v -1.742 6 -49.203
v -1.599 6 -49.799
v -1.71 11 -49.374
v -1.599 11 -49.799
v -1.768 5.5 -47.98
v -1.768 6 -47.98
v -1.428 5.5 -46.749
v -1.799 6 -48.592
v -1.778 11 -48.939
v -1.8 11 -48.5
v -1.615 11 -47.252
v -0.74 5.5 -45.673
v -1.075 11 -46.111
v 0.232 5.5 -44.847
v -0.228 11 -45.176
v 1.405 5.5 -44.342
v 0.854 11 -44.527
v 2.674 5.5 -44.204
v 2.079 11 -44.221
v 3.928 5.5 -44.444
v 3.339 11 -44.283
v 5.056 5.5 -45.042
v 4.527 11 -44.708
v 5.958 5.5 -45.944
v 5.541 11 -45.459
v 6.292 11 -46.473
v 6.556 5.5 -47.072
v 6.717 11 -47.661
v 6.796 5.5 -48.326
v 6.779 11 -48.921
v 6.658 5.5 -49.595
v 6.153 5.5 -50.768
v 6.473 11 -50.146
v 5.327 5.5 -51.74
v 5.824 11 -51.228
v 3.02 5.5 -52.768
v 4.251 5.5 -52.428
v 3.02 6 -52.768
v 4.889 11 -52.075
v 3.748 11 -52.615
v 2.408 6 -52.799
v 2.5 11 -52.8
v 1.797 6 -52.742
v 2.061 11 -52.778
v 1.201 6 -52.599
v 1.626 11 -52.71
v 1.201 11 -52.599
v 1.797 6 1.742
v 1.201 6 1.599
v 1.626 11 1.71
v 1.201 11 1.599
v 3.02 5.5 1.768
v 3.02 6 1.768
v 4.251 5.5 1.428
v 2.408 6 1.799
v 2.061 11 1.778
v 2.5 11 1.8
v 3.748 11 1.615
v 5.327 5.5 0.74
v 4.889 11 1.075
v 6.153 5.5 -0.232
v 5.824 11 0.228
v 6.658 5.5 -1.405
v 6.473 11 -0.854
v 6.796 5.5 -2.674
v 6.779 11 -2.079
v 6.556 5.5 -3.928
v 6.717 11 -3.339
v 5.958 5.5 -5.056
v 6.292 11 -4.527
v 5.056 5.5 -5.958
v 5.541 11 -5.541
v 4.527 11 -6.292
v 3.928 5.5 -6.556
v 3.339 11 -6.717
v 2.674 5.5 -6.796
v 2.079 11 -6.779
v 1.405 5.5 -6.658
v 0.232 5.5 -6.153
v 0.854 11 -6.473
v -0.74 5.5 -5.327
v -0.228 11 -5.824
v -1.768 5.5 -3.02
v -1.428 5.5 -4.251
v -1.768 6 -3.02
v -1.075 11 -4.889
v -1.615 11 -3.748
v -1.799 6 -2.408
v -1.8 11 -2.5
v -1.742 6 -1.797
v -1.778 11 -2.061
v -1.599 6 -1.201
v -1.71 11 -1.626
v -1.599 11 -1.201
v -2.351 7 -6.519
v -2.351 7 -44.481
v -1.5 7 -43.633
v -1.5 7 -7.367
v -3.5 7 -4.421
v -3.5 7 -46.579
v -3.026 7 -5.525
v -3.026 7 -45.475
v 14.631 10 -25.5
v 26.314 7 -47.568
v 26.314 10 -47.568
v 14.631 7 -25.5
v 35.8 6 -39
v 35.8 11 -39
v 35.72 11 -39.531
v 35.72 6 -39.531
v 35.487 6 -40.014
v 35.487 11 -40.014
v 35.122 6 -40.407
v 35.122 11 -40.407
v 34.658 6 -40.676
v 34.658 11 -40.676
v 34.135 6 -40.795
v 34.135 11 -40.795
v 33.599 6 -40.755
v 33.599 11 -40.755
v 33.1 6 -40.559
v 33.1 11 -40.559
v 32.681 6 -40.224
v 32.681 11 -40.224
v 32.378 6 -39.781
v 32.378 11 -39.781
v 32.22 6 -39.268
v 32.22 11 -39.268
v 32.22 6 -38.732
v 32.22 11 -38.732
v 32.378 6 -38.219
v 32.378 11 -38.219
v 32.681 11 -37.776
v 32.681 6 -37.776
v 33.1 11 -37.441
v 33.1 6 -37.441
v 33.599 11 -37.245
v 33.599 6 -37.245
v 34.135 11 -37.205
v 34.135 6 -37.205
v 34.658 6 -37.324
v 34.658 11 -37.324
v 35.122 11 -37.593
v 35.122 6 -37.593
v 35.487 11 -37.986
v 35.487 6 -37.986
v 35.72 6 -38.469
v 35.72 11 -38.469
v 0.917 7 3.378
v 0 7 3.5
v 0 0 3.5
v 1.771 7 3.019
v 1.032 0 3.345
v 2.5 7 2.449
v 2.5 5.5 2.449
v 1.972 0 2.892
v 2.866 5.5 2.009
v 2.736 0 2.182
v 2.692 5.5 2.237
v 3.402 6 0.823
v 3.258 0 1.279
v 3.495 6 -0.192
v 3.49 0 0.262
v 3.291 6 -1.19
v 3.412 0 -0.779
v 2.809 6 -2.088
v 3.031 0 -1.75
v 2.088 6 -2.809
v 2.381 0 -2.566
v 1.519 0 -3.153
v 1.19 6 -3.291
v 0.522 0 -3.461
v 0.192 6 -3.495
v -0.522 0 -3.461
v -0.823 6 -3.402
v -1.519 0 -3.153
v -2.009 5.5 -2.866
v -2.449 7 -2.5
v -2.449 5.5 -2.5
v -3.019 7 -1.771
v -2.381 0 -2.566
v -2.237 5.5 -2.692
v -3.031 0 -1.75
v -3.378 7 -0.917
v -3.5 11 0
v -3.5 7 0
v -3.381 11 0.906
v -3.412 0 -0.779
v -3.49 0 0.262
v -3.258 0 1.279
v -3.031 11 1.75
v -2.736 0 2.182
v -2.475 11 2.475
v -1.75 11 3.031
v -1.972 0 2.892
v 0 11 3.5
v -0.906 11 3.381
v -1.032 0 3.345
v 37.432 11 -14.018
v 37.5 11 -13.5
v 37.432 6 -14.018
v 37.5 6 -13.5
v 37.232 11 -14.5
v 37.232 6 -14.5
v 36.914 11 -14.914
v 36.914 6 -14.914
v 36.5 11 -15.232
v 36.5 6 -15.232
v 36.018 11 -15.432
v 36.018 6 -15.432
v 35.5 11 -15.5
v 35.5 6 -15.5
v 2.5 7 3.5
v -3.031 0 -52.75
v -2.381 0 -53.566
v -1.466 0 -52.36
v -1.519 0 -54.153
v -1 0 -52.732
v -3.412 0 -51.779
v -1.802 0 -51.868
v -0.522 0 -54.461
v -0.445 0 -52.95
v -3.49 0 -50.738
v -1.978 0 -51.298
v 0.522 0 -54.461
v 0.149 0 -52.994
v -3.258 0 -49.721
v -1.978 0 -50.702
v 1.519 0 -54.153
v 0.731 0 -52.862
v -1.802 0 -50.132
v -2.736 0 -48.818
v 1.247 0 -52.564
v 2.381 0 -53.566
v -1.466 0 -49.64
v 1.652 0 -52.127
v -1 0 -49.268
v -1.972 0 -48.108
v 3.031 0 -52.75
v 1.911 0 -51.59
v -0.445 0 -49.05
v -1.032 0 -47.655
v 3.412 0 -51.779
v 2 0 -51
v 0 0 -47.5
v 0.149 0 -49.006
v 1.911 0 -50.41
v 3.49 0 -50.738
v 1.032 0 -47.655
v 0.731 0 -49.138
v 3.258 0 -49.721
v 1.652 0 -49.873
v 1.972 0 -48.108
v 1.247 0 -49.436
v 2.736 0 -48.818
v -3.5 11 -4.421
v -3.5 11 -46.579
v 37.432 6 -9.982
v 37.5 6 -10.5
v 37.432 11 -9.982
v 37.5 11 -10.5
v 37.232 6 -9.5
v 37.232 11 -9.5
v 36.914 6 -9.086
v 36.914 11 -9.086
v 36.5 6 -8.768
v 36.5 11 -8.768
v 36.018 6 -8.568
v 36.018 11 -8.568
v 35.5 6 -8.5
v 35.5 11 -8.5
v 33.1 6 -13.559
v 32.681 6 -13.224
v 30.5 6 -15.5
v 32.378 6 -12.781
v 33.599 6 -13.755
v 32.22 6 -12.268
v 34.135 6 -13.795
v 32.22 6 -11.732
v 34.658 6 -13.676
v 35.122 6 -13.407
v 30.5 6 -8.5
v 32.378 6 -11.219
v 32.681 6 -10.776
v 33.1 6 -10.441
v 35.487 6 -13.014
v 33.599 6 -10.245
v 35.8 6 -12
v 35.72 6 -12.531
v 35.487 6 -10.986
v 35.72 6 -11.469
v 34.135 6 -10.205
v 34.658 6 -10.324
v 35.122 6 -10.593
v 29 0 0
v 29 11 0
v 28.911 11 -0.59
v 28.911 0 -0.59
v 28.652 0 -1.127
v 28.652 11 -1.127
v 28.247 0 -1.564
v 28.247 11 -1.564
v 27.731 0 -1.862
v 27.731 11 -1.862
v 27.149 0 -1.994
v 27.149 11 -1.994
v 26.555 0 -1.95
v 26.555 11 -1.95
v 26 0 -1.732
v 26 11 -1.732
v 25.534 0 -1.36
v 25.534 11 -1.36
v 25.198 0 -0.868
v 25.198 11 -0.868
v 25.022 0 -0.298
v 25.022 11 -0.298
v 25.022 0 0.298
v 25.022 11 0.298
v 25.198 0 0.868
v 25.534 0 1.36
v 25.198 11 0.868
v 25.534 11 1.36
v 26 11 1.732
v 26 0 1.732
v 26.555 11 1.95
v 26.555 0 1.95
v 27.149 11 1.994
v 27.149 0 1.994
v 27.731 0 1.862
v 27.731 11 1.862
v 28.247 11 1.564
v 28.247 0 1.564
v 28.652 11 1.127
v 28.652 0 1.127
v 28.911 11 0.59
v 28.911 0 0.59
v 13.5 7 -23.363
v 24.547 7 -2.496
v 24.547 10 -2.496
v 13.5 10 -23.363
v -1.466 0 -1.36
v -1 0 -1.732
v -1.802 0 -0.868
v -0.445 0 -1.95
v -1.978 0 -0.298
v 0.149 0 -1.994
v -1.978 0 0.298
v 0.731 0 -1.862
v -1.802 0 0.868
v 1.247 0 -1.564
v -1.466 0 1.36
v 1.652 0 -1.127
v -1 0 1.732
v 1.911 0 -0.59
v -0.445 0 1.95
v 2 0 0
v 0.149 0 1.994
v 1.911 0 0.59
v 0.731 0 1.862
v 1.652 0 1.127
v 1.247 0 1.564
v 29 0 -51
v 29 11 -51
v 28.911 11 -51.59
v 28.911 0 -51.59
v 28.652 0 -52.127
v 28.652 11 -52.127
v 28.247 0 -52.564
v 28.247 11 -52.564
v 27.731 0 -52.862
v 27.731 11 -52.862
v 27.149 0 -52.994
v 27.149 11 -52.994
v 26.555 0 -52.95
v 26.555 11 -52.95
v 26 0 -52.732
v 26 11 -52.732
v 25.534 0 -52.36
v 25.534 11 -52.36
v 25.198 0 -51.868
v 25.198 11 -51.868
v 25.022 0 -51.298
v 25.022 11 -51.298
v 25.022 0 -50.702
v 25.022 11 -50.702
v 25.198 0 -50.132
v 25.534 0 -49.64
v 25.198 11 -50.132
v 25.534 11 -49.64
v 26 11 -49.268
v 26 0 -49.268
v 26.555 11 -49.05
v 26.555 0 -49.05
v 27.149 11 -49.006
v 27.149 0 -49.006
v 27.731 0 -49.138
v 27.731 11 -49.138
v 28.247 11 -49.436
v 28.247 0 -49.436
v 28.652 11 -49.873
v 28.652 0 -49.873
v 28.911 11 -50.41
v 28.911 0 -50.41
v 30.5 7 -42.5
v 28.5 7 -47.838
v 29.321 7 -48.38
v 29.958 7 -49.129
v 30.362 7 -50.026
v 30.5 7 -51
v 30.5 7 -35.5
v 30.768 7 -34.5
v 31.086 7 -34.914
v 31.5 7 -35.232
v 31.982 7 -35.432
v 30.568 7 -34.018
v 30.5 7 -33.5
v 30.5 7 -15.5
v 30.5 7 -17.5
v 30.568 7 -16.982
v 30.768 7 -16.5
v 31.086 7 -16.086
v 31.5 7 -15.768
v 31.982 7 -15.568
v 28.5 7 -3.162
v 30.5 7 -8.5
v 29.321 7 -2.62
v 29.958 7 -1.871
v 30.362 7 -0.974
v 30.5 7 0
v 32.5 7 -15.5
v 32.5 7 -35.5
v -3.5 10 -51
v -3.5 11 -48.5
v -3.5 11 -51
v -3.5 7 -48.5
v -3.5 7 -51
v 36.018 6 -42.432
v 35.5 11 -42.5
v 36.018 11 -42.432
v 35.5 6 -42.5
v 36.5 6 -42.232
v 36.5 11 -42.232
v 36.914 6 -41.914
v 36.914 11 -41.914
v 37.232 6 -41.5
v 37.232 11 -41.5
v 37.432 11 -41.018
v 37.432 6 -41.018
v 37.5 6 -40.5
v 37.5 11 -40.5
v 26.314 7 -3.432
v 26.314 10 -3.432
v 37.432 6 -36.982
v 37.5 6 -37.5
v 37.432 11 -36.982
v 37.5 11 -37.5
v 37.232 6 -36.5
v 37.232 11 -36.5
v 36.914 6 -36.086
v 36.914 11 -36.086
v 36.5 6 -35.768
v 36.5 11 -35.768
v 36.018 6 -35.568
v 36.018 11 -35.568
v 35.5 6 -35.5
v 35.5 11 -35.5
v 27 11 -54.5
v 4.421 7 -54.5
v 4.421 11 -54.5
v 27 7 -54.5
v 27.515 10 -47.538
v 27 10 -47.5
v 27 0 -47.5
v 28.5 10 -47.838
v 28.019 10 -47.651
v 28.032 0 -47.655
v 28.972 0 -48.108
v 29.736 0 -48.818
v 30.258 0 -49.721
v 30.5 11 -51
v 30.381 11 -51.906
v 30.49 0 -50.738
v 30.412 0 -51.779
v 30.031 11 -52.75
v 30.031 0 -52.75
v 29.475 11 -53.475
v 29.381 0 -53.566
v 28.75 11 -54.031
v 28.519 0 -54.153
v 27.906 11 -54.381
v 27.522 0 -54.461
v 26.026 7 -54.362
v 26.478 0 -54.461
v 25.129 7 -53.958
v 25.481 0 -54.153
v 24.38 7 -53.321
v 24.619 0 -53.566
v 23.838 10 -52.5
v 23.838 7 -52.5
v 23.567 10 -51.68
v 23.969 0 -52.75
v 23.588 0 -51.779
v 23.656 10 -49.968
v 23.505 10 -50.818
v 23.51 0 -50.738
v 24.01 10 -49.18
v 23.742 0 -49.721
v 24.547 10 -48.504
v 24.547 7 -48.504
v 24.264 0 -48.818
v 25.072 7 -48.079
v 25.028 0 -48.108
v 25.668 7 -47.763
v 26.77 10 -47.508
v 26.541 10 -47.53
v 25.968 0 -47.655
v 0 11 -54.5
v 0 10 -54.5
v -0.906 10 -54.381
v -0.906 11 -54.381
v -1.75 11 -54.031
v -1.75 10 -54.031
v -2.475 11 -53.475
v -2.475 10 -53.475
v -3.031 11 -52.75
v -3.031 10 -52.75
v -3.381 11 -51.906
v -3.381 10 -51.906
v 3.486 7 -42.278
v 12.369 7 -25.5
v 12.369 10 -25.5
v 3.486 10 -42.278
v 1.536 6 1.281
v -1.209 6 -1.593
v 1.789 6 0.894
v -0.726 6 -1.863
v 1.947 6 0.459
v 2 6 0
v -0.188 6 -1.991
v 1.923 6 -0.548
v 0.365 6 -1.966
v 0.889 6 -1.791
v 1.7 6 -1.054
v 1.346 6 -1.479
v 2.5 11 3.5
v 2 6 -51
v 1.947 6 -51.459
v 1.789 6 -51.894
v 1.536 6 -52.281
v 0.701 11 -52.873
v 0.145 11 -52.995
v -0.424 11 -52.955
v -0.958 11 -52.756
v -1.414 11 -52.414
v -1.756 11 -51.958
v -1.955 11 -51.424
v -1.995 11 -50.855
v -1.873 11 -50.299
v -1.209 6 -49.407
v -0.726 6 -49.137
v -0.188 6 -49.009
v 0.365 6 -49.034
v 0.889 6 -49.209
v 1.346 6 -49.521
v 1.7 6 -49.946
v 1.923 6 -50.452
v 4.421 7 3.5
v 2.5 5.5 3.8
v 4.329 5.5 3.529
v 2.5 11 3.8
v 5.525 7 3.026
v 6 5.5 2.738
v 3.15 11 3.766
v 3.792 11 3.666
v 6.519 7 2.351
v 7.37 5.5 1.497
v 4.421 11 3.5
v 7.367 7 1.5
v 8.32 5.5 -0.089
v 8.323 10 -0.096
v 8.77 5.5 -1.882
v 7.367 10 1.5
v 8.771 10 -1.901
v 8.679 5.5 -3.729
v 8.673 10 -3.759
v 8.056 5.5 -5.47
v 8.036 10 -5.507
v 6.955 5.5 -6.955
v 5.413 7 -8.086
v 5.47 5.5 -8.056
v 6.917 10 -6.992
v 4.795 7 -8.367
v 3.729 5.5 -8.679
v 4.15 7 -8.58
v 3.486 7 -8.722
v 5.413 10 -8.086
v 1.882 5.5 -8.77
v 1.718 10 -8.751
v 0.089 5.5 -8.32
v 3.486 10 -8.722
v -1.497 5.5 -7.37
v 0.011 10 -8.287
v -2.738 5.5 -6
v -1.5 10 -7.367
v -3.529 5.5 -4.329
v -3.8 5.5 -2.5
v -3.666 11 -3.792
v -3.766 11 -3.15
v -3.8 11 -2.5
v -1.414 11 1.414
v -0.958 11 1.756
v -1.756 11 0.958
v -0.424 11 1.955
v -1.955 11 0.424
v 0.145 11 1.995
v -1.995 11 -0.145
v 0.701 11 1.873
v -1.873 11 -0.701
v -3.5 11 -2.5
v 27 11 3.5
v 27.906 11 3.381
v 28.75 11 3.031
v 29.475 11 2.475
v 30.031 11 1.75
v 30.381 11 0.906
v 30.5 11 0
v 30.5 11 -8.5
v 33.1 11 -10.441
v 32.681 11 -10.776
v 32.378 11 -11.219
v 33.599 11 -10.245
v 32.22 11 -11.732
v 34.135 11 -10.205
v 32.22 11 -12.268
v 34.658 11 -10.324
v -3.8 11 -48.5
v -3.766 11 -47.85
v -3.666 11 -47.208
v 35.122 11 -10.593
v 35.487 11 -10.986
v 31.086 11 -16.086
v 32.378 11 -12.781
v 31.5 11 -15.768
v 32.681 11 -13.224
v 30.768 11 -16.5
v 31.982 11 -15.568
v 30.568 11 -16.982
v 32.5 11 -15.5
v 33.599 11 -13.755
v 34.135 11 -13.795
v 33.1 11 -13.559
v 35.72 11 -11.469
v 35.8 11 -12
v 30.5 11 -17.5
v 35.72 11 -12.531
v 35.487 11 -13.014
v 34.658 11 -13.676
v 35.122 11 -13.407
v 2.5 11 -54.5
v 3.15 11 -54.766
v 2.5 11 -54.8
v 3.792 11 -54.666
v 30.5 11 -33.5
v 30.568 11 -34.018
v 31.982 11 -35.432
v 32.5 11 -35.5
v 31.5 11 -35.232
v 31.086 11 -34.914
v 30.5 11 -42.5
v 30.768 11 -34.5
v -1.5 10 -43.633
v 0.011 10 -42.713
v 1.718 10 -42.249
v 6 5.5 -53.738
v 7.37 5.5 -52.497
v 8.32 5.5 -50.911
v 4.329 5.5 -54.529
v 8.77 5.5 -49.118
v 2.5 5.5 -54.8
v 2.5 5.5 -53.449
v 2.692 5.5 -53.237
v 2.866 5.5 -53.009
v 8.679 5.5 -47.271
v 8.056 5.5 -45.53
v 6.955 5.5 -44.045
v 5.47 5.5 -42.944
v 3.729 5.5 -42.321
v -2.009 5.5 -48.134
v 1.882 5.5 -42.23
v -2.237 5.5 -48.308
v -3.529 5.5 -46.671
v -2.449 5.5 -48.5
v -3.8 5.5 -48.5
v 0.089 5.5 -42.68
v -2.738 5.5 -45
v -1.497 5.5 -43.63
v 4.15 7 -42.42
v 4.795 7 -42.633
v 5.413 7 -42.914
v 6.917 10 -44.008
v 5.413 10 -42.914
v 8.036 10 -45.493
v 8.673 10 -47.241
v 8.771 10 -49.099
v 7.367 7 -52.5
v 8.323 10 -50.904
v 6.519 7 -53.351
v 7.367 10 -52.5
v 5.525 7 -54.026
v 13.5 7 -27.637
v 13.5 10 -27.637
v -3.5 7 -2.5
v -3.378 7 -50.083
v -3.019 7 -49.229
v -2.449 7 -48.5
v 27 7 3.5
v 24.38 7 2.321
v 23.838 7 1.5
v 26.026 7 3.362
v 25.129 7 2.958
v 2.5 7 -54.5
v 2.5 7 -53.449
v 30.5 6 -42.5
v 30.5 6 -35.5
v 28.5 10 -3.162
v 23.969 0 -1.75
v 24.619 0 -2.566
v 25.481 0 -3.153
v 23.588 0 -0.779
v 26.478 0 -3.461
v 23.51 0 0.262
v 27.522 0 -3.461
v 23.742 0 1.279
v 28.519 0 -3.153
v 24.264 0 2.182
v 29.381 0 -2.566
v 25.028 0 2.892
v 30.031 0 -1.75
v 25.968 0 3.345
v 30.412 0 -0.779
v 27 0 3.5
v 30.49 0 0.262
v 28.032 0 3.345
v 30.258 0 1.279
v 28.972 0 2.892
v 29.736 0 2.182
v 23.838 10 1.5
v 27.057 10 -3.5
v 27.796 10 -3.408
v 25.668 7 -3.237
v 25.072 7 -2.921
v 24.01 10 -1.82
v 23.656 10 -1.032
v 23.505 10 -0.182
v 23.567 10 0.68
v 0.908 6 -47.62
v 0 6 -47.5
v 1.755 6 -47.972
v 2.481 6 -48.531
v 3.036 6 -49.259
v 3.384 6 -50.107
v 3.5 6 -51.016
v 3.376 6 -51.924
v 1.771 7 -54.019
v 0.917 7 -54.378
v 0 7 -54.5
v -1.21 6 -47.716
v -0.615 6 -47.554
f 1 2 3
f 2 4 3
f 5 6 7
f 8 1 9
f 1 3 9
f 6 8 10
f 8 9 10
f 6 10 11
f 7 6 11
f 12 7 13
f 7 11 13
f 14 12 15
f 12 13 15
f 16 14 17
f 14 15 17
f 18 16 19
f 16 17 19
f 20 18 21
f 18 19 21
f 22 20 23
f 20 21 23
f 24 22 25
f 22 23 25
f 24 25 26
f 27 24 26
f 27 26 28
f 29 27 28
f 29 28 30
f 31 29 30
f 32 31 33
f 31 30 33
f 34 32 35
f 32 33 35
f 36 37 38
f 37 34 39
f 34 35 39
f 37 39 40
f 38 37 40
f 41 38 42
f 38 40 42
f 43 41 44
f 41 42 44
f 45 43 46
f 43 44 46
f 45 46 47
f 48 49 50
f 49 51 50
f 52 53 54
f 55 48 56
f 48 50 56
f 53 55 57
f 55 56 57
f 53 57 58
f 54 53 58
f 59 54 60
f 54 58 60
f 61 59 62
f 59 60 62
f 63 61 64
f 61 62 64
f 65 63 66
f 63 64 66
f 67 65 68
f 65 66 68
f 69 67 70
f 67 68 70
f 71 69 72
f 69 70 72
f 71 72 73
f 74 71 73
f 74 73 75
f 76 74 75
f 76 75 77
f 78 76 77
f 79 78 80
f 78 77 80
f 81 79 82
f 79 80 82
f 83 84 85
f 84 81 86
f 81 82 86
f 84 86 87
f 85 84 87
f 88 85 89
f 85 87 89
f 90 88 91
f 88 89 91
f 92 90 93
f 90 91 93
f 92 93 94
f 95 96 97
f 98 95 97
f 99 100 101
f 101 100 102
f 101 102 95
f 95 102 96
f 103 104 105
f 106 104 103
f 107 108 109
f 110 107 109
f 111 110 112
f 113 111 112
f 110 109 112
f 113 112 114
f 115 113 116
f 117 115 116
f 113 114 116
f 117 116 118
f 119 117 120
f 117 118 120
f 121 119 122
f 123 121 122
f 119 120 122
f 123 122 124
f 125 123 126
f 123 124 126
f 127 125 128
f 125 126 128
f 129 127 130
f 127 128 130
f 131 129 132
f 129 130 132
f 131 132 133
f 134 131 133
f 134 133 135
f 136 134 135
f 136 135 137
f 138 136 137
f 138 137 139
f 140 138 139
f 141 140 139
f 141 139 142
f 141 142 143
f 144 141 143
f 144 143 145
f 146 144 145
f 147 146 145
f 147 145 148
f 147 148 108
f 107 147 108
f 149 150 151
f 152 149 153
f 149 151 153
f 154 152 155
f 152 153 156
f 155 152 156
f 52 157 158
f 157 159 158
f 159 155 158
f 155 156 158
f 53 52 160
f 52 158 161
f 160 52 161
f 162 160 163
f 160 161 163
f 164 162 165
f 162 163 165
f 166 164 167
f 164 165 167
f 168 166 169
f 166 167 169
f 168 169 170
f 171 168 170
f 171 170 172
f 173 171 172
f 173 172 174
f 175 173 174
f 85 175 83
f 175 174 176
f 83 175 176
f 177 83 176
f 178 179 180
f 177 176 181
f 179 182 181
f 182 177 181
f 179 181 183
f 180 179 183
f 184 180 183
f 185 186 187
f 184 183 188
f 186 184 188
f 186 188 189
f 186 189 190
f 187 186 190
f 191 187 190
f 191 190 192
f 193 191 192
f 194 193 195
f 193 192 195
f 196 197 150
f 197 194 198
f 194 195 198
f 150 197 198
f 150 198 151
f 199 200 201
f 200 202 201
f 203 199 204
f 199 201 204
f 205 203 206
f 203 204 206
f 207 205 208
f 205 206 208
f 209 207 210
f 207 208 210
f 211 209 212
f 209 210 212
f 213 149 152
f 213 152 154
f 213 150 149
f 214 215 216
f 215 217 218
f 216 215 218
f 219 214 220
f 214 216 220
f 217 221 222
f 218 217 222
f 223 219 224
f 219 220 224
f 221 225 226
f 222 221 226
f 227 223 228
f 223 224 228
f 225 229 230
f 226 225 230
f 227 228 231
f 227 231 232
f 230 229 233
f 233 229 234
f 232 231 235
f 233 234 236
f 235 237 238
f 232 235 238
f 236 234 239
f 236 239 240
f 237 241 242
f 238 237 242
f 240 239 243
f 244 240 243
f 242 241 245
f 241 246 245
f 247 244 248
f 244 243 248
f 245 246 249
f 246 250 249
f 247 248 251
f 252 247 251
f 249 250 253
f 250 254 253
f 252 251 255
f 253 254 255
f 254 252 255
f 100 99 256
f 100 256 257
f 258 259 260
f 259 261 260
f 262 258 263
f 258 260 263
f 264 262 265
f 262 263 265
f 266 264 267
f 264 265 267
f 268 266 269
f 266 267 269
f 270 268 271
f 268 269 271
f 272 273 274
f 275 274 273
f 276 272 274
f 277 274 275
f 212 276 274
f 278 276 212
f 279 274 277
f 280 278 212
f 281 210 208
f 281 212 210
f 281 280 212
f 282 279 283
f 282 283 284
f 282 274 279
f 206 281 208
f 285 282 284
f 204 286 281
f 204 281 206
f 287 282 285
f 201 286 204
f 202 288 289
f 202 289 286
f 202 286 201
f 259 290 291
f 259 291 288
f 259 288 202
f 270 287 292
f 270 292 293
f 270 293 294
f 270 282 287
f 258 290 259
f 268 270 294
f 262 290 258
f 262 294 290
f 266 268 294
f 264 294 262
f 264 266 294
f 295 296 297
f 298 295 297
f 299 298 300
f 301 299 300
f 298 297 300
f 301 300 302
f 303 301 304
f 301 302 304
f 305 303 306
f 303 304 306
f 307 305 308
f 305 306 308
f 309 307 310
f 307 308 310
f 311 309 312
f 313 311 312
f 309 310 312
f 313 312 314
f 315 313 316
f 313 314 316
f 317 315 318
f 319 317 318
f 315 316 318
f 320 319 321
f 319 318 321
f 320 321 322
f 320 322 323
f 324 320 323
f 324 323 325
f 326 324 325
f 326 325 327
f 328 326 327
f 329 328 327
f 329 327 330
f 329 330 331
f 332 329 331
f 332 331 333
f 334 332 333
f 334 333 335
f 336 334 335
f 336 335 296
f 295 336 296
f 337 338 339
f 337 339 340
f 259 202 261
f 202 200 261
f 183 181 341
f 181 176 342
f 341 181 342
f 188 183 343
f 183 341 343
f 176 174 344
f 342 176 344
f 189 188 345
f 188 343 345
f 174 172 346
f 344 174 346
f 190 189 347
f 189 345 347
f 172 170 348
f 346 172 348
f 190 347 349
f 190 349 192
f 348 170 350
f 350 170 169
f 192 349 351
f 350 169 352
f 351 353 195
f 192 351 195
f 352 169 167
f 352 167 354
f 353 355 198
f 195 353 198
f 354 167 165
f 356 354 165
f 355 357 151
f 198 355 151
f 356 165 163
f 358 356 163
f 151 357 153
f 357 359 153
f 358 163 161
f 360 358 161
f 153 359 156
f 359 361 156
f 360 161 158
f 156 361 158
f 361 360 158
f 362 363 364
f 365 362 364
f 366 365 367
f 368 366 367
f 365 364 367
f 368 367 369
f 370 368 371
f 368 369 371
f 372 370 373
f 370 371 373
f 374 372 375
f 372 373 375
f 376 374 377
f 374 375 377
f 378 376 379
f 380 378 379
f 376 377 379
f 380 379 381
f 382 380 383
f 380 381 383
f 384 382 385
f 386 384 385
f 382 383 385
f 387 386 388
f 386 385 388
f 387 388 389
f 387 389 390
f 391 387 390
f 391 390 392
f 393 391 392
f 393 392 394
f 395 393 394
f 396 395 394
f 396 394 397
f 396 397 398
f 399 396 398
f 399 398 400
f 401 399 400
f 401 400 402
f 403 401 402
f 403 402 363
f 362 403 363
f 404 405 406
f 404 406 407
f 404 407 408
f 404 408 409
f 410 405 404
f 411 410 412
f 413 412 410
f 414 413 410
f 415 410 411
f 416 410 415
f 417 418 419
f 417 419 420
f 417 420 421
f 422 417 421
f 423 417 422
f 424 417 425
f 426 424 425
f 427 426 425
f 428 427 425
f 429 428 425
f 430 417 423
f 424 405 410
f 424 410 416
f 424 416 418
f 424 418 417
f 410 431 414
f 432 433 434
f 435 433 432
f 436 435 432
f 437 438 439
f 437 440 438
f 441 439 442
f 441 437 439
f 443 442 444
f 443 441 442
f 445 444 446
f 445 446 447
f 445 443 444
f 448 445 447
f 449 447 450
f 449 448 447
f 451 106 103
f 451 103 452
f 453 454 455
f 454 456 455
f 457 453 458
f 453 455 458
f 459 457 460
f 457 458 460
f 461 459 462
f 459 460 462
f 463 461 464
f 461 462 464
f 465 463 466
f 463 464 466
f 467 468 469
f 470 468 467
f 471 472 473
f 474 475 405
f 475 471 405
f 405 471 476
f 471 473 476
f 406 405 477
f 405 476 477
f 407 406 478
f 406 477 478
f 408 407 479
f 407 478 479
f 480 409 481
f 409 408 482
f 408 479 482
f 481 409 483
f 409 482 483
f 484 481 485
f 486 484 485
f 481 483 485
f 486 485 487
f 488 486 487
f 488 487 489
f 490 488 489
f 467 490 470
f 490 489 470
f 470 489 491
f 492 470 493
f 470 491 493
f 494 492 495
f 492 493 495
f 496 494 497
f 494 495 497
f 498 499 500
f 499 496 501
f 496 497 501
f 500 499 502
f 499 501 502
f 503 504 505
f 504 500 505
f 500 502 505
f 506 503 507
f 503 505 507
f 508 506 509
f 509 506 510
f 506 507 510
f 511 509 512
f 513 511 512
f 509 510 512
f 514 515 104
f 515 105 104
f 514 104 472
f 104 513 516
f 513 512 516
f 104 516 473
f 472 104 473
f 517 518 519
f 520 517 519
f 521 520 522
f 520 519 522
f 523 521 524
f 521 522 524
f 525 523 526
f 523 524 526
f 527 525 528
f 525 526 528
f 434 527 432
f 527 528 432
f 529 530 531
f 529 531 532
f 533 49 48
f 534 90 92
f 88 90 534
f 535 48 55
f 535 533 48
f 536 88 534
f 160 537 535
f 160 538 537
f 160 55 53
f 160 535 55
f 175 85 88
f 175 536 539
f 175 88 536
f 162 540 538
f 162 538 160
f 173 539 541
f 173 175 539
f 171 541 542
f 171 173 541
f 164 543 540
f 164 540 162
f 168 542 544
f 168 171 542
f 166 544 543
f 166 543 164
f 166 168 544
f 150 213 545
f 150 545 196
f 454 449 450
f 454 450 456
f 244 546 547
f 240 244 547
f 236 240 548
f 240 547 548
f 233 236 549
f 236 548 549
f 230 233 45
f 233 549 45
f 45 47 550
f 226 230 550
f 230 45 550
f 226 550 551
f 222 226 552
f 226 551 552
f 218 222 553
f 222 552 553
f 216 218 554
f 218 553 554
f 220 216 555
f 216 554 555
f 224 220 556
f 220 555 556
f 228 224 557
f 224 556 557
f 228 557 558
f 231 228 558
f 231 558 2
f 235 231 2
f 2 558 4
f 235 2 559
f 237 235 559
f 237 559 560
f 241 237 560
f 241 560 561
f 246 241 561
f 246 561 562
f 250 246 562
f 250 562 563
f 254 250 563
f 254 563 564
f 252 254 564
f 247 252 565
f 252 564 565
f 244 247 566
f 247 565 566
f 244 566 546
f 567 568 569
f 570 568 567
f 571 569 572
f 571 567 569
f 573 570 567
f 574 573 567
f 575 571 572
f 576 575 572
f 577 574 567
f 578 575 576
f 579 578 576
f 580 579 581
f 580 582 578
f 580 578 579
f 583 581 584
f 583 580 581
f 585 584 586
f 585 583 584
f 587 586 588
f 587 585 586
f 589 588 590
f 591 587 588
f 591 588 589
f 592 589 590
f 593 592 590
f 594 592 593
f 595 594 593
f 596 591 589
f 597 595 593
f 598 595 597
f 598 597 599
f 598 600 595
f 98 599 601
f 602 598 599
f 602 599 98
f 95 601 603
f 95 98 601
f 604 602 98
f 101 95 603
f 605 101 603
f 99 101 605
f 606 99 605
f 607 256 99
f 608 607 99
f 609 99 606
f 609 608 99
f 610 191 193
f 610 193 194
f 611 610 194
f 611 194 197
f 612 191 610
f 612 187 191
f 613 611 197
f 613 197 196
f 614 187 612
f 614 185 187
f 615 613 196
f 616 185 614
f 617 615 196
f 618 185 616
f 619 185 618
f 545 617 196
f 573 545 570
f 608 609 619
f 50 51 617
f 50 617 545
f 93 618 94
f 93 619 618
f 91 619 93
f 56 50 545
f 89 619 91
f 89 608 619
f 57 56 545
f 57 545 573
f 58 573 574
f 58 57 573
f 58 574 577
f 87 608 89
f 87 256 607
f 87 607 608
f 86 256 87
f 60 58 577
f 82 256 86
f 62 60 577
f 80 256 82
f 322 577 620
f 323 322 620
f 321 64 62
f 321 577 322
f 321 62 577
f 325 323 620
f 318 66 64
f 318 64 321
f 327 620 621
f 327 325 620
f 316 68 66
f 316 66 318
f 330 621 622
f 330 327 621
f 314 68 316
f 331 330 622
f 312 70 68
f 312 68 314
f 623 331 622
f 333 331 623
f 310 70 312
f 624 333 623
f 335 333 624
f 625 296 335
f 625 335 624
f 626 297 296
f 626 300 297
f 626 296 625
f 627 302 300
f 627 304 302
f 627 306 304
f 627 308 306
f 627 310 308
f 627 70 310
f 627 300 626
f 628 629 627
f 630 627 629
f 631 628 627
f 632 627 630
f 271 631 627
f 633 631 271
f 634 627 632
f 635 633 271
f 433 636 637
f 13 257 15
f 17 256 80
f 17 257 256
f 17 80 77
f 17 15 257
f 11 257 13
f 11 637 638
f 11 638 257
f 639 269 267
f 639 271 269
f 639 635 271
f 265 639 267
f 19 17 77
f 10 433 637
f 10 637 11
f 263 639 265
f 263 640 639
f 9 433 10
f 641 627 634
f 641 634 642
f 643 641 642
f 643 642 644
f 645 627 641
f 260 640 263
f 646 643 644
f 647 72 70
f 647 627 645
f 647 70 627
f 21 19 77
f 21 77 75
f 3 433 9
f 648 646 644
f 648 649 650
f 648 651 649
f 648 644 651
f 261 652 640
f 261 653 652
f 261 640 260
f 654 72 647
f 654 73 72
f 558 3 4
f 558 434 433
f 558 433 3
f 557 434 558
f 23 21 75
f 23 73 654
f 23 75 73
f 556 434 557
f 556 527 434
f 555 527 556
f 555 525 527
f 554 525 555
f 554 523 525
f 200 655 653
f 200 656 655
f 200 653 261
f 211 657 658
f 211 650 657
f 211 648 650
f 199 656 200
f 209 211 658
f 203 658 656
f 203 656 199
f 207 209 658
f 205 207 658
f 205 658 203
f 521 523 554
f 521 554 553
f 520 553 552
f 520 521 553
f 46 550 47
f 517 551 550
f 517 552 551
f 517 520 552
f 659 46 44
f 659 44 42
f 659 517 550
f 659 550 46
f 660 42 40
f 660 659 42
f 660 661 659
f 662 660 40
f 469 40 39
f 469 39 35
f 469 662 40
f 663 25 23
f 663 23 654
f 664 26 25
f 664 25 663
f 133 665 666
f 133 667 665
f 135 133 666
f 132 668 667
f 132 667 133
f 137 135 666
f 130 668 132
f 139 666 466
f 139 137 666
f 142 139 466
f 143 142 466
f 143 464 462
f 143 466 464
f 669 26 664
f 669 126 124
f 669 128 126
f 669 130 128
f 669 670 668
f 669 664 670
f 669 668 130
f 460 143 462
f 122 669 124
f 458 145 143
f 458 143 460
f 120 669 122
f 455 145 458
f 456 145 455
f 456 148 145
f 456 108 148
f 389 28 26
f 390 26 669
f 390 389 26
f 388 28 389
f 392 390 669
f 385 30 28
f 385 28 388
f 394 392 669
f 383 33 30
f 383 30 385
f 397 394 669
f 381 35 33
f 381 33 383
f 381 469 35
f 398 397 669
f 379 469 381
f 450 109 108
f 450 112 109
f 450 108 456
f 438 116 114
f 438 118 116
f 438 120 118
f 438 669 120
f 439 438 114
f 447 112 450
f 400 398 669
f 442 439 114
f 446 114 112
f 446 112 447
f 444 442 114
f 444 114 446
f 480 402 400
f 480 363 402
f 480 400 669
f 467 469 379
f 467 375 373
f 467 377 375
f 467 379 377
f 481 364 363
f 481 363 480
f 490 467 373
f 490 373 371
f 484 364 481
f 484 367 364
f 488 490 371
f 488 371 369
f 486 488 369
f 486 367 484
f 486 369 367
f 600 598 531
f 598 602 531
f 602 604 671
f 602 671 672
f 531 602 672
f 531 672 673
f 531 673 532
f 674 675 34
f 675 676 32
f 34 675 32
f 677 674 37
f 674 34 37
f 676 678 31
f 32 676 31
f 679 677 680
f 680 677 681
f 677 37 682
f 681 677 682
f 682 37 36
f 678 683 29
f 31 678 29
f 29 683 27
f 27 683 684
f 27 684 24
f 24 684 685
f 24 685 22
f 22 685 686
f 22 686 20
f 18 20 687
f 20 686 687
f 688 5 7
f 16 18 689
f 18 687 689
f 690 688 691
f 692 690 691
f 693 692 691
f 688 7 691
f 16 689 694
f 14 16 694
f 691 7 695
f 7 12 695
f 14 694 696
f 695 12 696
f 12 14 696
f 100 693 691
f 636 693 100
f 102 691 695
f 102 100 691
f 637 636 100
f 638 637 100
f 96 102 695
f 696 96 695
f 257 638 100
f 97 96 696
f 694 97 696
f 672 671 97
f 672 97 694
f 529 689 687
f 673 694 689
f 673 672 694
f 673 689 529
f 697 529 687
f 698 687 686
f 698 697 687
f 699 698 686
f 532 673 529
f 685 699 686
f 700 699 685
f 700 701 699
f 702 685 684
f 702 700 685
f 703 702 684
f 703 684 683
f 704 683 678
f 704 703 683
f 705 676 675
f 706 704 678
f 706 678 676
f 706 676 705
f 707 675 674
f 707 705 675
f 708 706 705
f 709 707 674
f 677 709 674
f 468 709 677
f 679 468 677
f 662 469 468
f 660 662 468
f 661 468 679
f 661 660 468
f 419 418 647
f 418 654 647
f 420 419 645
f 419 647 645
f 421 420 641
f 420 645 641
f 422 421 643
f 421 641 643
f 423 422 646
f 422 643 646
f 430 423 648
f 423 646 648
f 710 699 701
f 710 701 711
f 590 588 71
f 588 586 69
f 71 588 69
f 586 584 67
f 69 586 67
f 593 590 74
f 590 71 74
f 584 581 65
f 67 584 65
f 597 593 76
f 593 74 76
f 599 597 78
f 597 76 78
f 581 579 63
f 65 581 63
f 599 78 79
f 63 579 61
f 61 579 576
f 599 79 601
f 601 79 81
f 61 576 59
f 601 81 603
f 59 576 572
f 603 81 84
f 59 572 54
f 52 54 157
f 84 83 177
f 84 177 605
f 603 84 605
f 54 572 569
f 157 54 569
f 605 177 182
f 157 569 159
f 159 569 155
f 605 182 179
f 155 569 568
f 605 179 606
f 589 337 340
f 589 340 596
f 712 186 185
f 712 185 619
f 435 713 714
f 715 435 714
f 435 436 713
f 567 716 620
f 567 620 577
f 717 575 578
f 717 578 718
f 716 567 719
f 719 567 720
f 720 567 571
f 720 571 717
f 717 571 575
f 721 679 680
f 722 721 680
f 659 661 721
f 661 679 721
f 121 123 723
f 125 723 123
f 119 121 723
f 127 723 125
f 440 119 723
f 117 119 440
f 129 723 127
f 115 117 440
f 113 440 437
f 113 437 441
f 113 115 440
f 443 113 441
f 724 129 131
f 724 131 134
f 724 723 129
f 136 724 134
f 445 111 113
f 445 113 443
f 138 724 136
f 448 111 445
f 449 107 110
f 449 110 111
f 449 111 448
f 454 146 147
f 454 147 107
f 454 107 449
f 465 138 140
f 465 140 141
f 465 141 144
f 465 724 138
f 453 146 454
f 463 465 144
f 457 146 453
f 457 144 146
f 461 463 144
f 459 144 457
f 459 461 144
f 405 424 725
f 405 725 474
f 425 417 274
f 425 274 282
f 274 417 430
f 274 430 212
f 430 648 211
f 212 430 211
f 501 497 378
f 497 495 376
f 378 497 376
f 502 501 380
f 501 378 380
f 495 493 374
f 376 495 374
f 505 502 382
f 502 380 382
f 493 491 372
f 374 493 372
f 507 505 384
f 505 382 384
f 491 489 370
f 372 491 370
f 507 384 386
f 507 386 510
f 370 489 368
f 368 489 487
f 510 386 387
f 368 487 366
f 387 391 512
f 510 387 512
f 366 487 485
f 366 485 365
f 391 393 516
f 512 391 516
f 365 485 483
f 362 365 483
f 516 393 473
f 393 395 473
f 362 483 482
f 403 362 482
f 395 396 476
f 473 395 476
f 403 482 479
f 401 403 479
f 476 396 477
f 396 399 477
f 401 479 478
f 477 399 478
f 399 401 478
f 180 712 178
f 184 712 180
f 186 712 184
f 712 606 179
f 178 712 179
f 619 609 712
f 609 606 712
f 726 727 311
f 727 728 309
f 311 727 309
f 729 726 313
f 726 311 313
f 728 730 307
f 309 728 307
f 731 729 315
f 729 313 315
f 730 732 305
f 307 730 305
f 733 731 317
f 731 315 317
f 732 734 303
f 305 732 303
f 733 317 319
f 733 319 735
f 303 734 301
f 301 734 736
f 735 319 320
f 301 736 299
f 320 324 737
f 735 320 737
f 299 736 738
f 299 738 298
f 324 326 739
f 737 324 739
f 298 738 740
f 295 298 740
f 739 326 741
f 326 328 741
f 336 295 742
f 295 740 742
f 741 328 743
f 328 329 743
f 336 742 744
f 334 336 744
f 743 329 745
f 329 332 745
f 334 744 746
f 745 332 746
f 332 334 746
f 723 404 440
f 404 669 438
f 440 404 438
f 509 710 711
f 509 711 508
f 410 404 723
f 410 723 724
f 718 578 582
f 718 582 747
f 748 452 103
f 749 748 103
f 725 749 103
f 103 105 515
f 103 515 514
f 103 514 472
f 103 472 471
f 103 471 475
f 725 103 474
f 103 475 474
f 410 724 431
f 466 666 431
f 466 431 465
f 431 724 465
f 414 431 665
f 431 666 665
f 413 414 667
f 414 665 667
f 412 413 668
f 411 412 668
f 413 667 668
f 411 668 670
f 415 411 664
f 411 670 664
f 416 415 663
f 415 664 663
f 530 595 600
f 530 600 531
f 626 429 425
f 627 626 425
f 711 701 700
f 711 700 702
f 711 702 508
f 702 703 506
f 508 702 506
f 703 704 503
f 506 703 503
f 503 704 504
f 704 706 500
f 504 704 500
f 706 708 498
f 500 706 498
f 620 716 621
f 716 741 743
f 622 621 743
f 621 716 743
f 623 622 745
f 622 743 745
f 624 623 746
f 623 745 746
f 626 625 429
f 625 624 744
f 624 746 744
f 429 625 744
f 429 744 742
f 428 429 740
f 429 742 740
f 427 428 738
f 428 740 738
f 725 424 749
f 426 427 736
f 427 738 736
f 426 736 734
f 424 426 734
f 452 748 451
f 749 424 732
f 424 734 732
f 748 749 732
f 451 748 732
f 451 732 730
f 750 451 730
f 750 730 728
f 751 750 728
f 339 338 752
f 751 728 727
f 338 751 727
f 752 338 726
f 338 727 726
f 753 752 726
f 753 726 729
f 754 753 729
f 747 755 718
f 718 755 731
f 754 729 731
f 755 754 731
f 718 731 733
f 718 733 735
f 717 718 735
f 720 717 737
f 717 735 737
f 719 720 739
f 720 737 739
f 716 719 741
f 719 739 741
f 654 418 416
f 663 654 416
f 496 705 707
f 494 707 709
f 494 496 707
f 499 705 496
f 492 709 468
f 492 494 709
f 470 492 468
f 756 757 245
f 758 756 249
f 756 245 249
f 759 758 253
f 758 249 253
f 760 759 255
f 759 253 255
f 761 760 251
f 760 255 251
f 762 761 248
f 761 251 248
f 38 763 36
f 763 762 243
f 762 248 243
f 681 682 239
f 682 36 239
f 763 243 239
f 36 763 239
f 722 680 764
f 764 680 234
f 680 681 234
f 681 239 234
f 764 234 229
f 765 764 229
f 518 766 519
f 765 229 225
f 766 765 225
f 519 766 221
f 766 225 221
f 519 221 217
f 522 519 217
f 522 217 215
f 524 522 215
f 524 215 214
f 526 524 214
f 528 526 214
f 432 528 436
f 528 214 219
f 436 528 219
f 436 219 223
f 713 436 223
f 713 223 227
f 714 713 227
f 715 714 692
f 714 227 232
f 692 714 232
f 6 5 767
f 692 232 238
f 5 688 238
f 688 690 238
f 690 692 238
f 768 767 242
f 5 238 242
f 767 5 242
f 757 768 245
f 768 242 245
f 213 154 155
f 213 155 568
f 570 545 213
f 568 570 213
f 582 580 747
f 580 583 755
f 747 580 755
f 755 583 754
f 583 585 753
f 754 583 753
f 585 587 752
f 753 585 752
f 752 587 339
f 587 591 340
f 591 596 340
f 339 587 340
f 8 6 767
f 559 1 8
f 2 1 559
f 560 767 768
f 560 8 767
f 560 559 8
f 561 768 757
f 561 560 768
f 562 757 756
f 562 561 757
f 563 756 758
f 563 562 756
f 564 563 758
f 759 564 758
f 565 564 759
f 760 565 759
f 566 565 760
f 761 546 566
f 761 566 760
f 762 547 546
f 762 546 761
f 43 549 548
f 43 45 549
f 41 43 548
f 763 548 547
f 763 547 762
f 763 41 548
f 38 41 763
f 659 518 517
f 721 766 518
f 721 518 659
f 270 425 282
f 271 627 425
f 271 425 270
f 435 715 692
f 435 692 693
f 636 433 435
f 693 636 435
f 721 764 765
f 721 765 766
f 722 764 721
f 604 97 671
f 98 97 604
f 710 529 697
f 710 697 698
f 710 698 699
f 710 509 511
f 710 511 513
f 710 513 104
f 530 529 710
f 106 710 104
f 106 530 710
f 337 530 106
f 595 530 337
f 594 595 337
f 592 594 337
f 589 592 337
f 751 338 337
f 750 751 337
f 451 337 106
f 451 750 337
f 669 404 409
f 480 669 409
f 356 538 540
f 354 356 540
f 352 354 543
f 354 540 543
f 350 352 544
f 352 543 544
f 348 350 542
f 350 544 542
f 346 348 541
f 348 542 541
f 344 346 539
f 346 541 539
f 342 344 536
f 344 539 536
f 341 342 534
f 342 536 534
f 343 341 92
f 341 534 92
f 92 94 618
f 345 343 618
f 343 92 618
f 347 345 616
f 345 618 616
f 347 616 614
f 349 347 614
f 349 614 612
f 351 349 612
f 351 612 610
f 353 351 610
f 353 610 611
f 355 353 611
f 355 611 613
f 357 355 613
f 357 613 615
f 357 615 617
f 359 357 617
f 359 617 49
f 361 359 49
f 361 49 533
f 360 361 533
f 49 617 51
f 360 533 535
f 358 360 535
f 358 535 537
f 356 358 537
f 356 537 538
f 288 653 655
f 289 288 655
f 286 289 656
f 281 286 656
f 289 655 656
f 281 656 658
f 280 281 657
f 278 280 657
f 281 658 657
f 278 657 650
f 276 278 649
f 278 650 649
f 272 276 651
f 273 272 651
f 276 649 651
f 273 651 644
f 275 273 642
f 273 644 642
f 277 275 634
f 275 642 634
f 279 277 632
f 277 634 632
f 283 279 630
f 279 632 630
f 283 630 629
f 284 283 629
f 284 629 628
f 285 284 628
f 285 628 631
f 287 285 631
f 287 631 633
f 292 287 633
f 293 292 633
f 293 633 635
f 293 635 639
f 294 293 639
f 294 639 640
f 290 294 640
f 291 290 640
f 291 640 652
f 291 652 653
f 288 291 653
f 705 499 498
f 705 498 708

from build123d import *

# Parameters (mm, degrees)
SKETCH1_R                       = 3.5
BOSS_EXTRUDE1_DEPTH             = 11
BOSS_EXTRUDE1_2_DEPTH           = 11
BOSS_EXTRUDE1_3_DEPTH           = 11
BOSS_EXTRUDE1_4_DEPTH           = 11
BOSS_EXTRUDE2_START             = -1
BOSS_EXTRUDE2_DEPTH             = 1
F_4_0MM_DOWEL_HOLE1_D           = 4
BOSS_EXTRUDE3_START             = 3
BOSS_EXTRUDE3_DEPTH             = 3
BOSS_EXTRUDE4_REACH             = 64.845
SKETCH11_W                      = 7
SKETCH11_H                      = 7
BOSS_EXTRUDE4_DIRECTION_2_DEPTH = 1
FILLET1_R                       = 2
M3_CLEARANCE_HOLE1_D            = 3.6
SKETCH15_R                      = 4.3
CUT_EXTRUDE1_DEPTH              = 5
BOSS_EXTRUDE6_START             = -1
BOSS_EXTRUDE6_DEPTH             = 5.5


with BuildPart() as part:
    # Sketch1 → Boss-Extrude1 (new body)
    with BuildSketch(Plane(origin=(0, 0, 0), x_dir=(1, 0, 0), z_dir=(0, 1, 0))):
        with Locations(Location((0, 51, 0), (0, 0, 270))):
            Circle(SKETCH1_R)
    extrude(amount=BOSS_EXTRUDE1_DEPTH)



with BuildPart() as body_2:
    # Sketch1 → Boss-Extrude1 2 (new body)
    with BuildSketch(Plane(origin=(0, 0, 0), x_dir=(1, 0, 0), z_dir=(0, 1, 0))):
        with Locations(Location((27, 51, 0), (0, 0, 270))):
            Circle(SKETCH1_R)
    extrude(amount=BOSS_EXTRUDE1_2_DEPTH)


with BuildPart() as body_3:
    # Sketch1 → Boss-Extrude1 3 (new body)
    with BuildSketch(Plane(origin=(0, 0, 0), x_dir=(1, 0, 0), z_dir=(0, 1, 0))):
        with Locations(Location((27, 0, 0), (0, 0, 270))):
            Circle(SKETCH1_R)
    extrude(amount=BOSS_EXTRUDE1_3_DEPTH)


with BuildPart() as body_4:
    # Sketch1 → Boss-Extrude1 4 (new body)
    with BuildSketch(Plane(origin=(0, 0, 0), x_dir=(1, 0, 0), z_dir=(0, 1, 0))):
        with Locations(Location((0, 0, 0), (0, 0, 270))):
            Circle(SKETCH1_R)
    extrude(amount=BOSS_EXTRUDE1_4_DEPTH)


with BuildPart() as part_1:
    add(part.part)

    add(body_2.part)  # Boss-Extrude2 merges body 2

    add(body_3.part)  # Boss-Extrude2 merges body 3

    add(body_4.part)  # Boss-Extrude2 merges body 4
    # Sketch2 → Boss-Extrude2 (add)
    with BuildSketch(Plane(origin=(0, 11, 0), x_dir=(1, 0, 0), z_dir=(0, 1, 0)).offset(BOSS_EXTRUDE2_START)):
        with BuildLine():
            Line((27, 54.5), (0, 54.5))
            ThreePointArc((0, 54.5), (-2.474873734, 53.474873734), (-3.5, 51))
            Line((-3.5, 51), (-3.5, 0))
            ThreePointArc((-3.5, 0), (-2.474873734, -2.474873734), (0, -3.5))
            Line((0, -3.5), (27, -3.5))
            ThreePointArc((27, -3.5), (29.474873734, -2.474873734), (30.5, 0))
            Line((30.5, 0), (30.5, 51))
            ThreePointArc((30.5, 51), (29.474873734, 53.474873734), (27, 54.5))
        make_face()
    extrude(amount=BOSS_EXTRUDE2_DEPTH)

    # Ø4.0mm Dowel Hole1 (through all)
    with Locations(Plane(origin=(0, 0, 0), x_dir=(-1, 0, 0), z_dir=(0, -1, 0))):
        with Locations((-27, 51), (0, 51), (0, 0), (-27, 0)):
            Hole(F_4_0MM_DOWEL_HOLE1_D / 2)

    # Sketch10 → Boss-Extrude3 (add)
    with BuildSketch(Plane.XZ.offset(-10).offset(BOSS_EXTRUDE3_START)):
        with BuildLine():
            ThreePointArc((-3.5, -51), (-2.958039892, -49.129171307), (-1.5, -47.83772234))
            Line((-1.5, -47.83772234), (-1.5, -3.16227766))
            ThreePointArc((-1.5, -3.16227766), (-2.958039892, -1.870828693), (-3.5, 0))
            Line((-3.5, 0), (-3.5, -51))
        make_face()
        with BuildLine():
            Line((3.16227766, 1.5), (23.83772234, 1.5))
            ThreePointArc((23.83772234, 1.5), (25.129171307, 2.958039892), (27, 3.5))
            Line((27, 3.5), (0, 3.5))
            ThreePointArc((0, 3.5), (1.870828693, 2.958039892), (3.16227766, 1.5))
        make_face()
        with BuildLine():
            Line((12.36850682, -25.5), (13.5, -23.362735104))
            Line((13.5, -23.362735104), (2.453131039, -2.496427068))
            ThreePointArc((2.453131039, -2.496427068), (1.637607021, -3.093257707), (0.685555207, -3.432202508))
            Line((0.685555207, -3.432202508), (12.36850682, -25.5))
        make_face()
        with BuildLine():
            ThreePointArc((26.314444793, -3.432202508), (25.362392979, -3.093257707), (24.546868961, -2.496427068))
            Line((24.546868961, -2.496427068), (13.5, -23.362735104))
            Line((13.5, -23.362735104), (14.63149318, -25.5))
            Line((14.63149318, -25.5), (26.314444793, -3.432202508))
        make_face()
        with BuildLine():
            ThreePointArc((30.5, 0), (29.958039892, -1.870828693), (28.5, -3.16227766))
            Line((28.5, -3.16227766), (28.5, -47.83772234))
            ThreePointArc((28.5, -47.83772234), (29.958039892, -49.129171307), (30.5, -51))
            Line((30.5, -51), (30.5, 0))
        make_face()
        with BuildLine():
            ThreePointArc((27, -54.5), (25.129171307, -53.958039892), (23.83772234, -52.5))
            Line((23.83772234, -52.5), (3.16227766, -52.5))
            ThreePointArc((3.16227766, -52.5), (1.870828693, -53.958039892), (0, -54.5))
            Line((0, -54.5), (27, -54.5))
        make_face()
        Polygon((14.63149318, -25.5), (13.5, -23.362735104), (12.36850682, -25.5), (13.5, -27.637264896), align=None)
        with BuildLine():
            Line((26.314444793, -47.567797492), (14.63149318, -25.5))
            Line((14.63149318, -25.5), (13.5, -27.637264896))
            Line((13.5, -27.637264896), (24.546868961, -48.503572932))
            ThreePointArc((24.546868961, -48.503572932), (25.362392979, -47.906742293), (26.314444793, -47.567797492))
        make_face()
        with BuildLine():
            Line((13.5, -27.637264896), (12.36850682, -25.5))
            Line((12.36850682, -25.5), (0.685555207, -47.567797492))
            ThreePointArc((0.685555207, -47.567797492), (1.637607021, -47.906742293), (2.453131039, -48.503572932))
            Line((2.453131039, -48.503572932), (13.5, -27.637264896))
        make_face()
    extrude(amount=-BOSS_EXTRUDE3_DEPTH)

    # Boss-Extrude4: up to this face of the body (flat: up to its plane)
    boss_extrude4_end = Plane(part_1.part.faces().sort_by_distance((13.5, 11, -25.5))[0])
    # Sketch11 → Boss-Extrude4 (add, up to the picked face)
    with BuildSketch(Plane.XZ.offset(-7), mode=Mode.PRIVATE) as boss_extrude4_sk1:
        with Locations((34, -12)):
            Rectangle(SKETCH11_W, SKETCH11_H)
    boss_extrude4_tool1 = split(extrude(boss_extrude4_sk1.sketch, amount=-BOSS_EXTRUDE4_REACH, mode=Mode.PRIVATE), bisect_by=boss_extrude4_end, keep=Keep.BOTH, mode=Mode.PRIVATE)
    # Sketch11 → Boss-Extrude4 (add, up to the picked face)
    with BuildSketch(Plane.XZ.offset(-7), mode=Mode.PRIVATE) as boss_extrude4_sk2:
        with Locations((34, -39)):
            Rectangle(SKETCH11_W, SKETCH11_H)
    boss_extrude4_tool2 = split(extrude(boss_extrude4_sk2.sketch, amount=-BOSS_EXTRUDE4_REACH, mode=Mode.PRIVATE), bisect_by=boss_extrude4_end, keep=Keep.BOTH, mode=Mode.PRIVATE)
    add(boss_extrude4_tool1.solids().sort_by(Axis((34, 7, -12), (0, 1, 0)))[0])
    add(boss_extrude4_tool2.solids().sort_by(Axis((34, 7, -39), (0, 1, 0)))[0])

    # Sketch11 → Boss-Extrude4 direction 2 (add)
    with BuildSketch(Plane.XZ.offset(-7)):
        with Locations((34, -12)):
            Rectangle(SKETCH11_W, SKETCH11_H)
        with Locations((34, -39)):
            Rectangle(SKETCH11_W, SKETCH11_H)
    extrude(amount=BOSS_EXTRUDE4_DIRECTION_2_DEPTH)

    # Fillet1
    fillet1_edges = [part_1.edges().sort_by_distance(p)[0] for p in [
        (30.5, 9, -15.5),
        (37.5, 8.5, -15.5),
        (37.5, 8.5, -8.5),
        (30.5, 9, -35.5),
        (37.5, 8.5, -42.5),
        (37.5, 8.5, -35.5),
    ]]
    fillet(fillet1_edges, radius=FILLET1_R)

    # M3 Clearance Hole1 (through all)
    with Locations(Plane(origin=(0, 6, 0), x_dir=(-1, 0, 0), z_dir=(0, -1, 0))):
        with Locations((-34, 12), (-34, 39)):
            Hole(M3_CLEARANCE_HOLE1_D / 2)

    # Sketch15 → Cut-Extrude1 (cut)
    with BuildSketch(Plane(origin=(0, 11, 0), x_dir=(1, 0, 0), z_dir=(0, 1, 0))):
        with Locations((2.5, 48.5)):
            Circle(SKETCH15_R)
        with Locations((2.5, 2.5)):
            Circle(SKETCH15_R)
    extrude(amount=-CUT_EXTRUDE1_DEPTH, mode=Mode.SUBTRACT)

    # Sketch17 → Boss-Extrude6 (add)
    with BuildSketch(Plane.XZ.offset(-10).offset(BOSS_EXTRUDE6_START)):
        with BuildLine():
            Line((2.5, 1.8), (2.5, 3.8))
            ThreePointArc((2.5, 3.8), (6.954772721, -6.954772721), (-3.8, -2.5))
            Line((-3.8, -2.5), (-1.8, -2.5))
            ThreePointArc((-1.8, -2.5), (5.540559159, -5.540559159), (2.5, 1.8))
        make_face()
        with BuildLine():
            Line((-1.8, -48.5), (-3.8, -48.5))
            ThreePointArc((-3.8, -48.5), (6.954772721, -44.045227279), (2.5, -54.8))
            Line((2.5, -54.8), (2.5, -52.8))
            ThreePointArc((2.5, -52.8), (5.540559159, -45.459440841), (-1.8, -48.5))
        make_face()
    extrude(amount=BOSS_EXTRUDE6_DEPTH)


solid = part_1.part
